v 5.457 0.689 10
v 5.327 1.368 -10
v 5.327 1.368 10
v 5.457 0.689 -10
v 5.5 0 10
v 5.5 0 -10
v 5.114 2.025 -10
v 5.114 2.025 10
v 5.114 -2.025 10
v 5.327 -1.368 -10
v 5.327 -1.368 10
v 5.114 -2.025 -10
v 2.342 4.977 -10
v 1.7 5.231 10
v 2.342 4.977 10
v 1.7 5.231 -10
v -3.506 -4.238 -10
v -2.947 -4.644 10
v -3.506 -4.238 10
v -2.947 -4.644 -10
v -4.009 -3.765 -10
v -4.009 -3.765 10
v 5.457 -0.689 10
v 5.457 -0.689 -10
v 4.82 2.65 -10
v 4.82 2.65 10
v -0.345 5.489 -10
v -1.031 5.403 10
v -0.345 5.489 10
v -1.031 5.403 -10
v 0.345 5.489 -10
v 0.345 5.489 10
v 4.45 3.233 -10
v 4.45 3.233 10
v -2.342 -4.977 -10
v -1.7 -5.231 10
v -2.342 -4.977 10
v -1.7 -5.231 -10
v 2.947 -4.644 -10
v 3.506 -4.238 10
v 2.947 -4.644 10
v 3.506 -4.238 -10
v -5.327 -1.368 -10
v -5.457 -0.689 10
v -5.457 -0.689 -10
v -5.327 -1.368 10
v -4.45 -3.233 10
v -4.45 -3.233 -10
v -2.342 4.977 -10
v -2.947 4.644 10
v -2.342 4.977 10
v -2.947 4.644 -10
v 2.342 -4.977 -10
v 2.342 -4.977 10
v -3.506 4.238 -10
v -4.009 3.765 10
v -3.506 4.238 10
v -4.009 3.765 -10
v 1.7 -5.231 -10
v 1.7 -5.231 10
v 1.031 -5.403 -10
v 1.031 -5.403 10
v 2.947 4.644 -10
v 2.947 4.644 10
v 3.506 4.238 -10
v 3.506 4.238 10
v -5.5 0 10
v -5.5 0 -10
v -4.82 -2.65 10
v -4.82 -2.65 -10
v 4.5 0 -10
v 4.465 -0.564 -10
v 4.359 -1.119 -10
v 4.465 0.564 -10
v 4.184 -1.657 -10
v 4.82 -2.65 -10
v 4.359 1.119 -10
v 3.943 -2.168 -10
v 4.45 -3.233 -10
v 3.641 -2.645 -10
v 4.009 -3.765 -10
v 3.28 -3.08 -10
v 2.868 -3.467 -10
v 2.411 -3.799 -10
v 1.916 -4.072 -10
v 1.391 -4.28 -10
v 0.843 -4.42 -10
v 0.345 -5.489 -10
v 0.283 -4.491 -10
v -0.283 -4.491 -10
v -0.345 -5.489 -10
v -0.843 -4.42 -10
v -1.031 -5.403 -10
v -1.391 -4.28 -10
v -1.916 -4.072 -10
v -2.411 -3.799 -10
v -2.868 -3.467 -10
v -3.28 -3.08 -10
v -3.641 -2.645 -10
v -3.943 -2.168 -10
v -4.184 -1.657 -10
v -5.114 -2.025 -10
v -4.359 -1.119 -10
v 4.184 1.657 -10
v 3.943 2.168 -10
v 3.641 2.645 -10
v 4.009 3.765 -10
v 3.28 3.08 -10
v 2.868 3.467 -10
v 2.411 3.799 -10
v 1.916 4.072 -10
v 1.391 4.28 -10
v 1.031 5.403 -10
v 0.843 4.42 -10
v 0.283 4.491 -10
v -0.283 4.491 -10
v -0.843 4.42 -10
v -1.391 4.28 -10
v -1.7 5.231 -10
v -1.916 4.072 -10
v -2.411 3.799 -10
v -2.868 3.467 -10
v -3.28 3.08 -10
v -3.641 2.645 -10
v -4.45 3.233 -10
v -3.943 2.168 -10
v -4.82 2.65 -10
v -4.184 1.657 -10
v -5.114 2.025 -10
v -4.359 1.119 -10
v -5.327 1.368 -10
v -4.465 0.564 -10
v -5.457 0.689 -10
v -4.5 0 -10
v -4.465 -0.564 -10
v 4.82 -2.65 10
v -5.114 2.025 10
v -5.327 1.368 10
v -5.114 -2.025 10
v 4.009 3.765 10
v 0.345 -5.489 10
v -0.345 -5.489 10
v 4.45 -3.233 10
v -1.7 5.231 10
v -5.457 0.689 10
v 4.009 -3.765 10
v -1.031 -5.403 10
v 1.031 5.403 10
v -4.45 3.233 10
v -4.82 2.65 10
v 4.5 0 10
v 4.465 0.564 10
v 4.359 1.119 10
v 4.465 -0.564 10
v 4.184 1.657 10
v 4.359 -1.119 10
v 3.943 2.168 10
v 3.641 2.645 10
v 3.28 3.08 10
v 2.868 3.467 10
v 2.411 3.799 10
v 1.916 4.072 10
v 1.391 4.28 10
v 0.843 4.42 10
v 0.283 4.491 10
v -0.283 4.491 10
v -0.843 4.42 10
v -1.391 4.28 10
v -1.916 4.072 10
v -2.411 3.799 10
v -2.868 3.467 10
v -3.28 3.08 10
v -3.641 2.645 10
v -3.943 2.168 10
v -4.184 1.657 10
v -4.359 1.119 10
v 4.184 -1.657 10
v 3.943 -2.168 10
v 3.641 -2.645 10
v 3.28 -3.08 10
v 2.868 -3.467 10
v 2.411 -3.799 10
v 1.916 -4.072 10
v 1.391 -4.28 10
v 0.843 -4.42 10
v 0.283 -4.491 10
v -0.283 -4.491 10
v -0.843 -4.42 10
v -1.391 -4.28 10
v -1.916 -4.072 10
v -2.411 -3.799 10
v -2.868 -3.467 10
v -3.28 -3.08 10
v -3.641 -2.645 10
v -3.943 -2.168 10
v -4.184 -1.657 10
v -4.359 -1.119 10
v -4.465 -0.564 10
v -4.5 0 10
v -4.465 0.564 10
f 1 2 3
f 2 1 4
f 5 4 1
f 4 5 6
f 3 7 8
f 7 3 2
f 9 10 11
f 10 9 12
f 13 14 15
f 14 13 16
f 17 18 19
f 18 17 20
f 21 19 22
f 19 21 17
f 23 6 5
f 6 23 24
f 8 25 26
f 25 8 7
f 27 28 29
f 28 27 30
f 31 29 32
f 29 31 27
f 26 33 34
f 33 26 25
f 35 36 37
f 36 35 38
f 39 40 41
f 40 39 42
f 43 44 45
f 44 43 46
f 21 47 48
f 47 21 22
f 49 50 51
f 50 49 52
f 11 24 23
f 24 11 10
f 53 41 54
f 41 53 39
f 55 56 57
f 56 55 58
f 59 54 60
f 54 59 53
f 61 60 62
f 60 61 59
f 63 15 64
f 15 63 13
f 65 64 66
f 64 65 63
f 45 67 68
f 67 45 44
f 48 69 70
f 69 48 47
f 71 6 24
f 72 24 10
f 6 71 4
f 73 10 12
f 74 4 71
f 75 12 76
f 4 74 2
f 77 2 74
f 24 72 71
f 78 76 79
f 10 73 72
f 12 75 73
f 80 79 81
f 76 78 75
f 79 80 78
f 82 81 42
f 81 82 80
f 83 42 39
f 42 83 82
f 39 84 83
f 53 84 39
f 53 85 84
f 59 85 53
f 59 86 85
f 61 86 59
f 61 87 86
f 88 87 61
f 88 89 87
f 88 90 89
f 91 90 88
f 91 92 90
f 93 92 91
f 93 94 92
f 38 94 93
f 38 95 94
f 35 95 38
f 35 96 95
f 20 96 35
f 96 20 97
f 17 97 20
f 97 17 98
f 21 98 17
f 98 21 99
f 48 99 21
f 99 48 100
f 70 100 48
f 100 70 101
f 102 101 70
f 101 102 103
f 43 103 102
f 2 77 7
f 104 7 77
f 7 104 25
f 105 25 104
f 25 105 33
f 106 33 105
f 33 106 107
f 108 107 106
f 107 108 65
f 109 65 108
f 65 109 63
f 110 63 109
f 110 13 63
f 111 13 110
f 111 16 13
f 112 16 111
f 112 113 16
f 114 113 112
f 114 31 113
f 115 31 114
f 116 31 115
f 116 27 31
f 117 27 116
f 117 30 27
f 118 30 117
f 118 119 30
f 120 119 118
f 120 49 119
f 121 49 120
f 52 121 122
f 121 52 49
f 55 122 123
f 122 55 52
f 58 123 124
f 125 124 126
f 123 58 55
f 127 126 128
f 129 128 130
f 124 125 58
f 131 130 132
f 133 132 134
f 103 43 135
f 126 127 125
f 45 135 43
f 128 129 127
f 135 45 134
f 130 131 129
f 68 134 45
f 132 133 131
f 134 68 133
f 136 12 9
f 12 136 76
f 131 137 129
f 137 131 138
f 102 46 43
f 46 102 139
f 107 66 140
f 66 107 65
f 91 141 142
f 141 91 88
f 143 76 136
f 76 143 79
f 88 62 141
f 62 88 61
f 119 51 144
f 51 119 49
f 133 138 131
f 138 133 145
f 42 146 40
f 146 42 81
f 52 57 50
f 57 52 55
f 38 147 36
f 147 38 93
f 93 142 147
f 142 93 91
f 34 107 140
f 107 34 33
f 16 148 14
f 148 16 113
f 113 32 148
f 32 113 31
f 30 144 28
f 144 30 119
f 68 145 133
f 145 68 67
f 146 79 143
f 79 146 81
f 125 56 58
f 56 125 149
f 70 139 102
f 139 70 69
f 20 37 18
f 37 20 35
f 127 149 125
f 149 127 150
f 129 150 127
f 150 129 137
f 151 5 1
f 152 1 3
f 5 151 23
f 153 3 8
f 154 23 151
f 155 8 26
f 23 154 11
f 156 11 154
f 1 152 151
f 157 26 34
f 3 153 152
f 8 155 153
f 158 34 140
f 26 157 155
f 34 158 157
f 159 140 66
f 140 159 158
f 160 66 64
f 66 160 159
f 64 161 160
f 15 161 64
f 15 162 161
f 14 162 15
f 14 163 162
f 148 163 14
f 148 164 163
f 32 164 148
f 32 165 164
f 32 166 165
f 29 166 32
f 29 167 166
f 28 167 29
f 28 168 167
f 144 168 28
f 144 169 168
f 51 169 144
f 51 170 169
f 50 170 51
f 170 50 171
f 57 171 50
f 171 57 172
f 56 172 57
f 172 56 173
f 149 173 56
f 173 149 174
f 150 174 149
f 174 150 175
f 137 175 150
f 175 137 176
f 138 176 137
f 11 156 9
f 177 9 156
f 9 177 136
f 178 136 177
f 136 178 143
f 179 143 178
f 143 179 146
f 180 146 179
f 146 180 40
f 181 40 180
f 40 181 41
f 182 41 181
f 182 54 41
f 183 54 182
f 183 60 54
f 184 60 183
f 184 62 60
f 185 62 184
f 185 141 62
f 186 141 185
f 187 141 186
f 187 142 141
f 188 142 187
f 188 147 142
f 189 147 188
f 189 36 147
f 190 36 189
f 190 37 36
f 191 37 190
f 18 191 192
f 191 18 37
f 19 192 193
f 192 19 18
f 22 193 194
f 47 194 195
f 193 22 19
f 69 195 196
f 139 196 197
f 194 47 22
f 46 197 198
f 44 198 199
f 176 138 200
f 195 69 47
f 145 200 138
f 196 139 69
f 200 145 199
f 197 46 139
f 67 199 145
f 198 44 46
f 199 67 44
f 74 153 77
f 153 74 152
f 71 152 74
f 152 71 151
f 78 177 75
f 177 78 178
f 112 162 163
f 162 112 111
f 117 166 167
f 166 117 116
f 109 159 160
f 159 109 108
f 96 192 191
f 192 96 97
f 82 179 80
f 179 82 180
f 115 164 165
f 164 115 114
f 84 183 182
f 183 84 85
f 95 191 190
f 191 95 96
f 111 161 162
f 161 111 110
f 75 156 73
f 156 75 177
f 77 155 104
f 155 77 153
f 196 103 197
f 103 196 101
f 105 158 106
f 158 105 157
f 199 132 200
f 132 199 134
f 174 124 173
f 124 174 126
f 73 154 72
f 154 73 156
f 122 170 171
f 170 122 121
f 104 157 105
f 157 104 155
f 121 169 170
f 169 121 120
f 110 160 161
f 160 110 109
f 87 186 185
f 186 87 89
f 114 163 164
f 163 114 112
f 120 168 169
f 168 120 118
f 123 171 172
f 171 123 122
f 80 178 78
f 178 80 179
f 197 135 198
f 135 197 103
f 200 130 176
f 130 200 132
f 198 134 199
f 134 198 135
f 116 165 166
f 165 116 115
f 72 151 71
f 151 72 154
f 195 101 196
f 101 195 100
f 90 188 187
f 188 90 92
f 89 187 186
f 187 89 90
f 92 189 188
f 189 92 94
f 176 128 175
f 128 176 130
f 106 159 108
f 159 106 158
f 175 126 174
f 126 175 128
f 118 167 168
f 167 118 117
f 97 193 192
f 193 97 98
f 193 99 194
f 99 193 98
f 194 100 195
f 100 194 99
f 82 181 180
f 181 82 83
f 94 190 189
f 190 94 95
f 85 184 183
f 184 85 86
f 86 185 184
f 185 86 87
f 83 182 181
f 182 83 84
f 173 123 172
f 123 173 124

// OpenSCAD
$fn = 50;


difference() {
	union() {
		translate(v = [0, 0, -10.0000000000]) {
			cylinder(h = 20, r = 5.5000000000);
		}
	}
	union() {
		translate(v = [0, 0, -100.0000000000]) {
			cylinder(h = 200, r = 4.5000000000);
		}
	}
}
